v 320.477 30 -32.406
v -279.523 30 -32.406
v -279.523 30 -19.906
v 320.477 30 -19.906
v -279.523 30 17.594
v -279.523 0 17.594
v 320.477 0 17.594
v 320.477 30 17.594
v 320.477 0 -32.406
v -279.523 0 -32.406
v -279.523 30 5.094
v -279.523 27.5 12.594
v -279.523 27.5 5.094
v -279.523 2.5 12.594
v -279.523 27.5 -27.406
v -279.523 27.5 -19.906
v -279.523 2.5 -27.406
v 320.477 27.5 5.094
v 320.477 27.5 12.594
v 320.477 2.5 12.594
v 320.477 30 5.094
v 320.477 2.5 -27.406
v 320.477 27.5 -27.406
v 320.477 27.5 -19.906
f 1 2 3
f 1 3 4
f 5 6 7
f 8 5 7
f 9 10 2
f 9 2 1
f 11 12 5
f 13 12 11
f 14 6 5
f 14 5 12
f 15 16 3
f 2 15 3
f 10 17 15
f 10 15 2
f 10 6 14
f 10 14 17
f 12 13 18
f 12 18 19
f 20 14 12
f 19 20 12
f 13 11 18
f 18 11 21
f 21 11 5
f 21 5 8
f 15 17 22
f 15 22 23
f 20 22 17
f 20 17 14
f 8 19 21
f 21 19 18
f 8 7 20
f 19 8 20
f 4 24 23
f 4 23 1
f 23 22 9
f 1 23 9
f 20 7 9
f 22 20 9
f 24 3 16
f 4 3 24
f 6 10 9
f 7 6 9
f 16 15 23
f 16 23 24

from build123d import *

# Parameters (mm, degrees)
SKETCH1_W           = 600
SKETCH1_H           = 50
BOSS_EXTRUDE1_DEPTH = 30
SKETCH2_W           = 40
SKETCH2_H           = 25
CUT_EXTRUDE1_DEPTH  = 602.62290577
SKETCH3_W           = 600
SKETCH3_H           = 25
CUT_EXTRUDE2_DEPTH  = 20


with BuildPart() as part:
    # Sketch1 → Boss-Extrude1 (new body)
    with BuildSketch(Plane(origin=(0, 0, 0), x_dir=(1, 0, 0), z_dir=(0, 1, 0))):
        with Locations((20.477137177, 7.4055666)):
            Rectangle(SKETCH1_W, SKETCH1_H)
    extrude(amount=BOSS_EXTRUDE1_DEPTH)

    # Sketch2 → Cut-Extrude1 (cut, through all)
    with BuildSketch(Plane.ZY.offset(279.522862823)):
        with Locations((-7.4055666, 15)):
            Rectangle(SKETCH2_W, SKETCH2_H)
    extrude(amount=-CUT_EXTRUDE1_DEPTH, mode=Mode.SUBTRACT)

    # Sketch3 → Cut-Extrude2 (cut)
    with BuildSketch(Plane(origin=(0, 30, 0), x_dir=(1, 0, 0), z_dir=(0, 1, 0))):
        with Locations((20.477137177, 7.4055666)):
            Rectangle(SKETCH3_W, SKETCH3_H)
    extrude(amount=-CUT_EXTRUDE2_DEPTH, mode=Mode.SUBTRACT)


solid = part.part
